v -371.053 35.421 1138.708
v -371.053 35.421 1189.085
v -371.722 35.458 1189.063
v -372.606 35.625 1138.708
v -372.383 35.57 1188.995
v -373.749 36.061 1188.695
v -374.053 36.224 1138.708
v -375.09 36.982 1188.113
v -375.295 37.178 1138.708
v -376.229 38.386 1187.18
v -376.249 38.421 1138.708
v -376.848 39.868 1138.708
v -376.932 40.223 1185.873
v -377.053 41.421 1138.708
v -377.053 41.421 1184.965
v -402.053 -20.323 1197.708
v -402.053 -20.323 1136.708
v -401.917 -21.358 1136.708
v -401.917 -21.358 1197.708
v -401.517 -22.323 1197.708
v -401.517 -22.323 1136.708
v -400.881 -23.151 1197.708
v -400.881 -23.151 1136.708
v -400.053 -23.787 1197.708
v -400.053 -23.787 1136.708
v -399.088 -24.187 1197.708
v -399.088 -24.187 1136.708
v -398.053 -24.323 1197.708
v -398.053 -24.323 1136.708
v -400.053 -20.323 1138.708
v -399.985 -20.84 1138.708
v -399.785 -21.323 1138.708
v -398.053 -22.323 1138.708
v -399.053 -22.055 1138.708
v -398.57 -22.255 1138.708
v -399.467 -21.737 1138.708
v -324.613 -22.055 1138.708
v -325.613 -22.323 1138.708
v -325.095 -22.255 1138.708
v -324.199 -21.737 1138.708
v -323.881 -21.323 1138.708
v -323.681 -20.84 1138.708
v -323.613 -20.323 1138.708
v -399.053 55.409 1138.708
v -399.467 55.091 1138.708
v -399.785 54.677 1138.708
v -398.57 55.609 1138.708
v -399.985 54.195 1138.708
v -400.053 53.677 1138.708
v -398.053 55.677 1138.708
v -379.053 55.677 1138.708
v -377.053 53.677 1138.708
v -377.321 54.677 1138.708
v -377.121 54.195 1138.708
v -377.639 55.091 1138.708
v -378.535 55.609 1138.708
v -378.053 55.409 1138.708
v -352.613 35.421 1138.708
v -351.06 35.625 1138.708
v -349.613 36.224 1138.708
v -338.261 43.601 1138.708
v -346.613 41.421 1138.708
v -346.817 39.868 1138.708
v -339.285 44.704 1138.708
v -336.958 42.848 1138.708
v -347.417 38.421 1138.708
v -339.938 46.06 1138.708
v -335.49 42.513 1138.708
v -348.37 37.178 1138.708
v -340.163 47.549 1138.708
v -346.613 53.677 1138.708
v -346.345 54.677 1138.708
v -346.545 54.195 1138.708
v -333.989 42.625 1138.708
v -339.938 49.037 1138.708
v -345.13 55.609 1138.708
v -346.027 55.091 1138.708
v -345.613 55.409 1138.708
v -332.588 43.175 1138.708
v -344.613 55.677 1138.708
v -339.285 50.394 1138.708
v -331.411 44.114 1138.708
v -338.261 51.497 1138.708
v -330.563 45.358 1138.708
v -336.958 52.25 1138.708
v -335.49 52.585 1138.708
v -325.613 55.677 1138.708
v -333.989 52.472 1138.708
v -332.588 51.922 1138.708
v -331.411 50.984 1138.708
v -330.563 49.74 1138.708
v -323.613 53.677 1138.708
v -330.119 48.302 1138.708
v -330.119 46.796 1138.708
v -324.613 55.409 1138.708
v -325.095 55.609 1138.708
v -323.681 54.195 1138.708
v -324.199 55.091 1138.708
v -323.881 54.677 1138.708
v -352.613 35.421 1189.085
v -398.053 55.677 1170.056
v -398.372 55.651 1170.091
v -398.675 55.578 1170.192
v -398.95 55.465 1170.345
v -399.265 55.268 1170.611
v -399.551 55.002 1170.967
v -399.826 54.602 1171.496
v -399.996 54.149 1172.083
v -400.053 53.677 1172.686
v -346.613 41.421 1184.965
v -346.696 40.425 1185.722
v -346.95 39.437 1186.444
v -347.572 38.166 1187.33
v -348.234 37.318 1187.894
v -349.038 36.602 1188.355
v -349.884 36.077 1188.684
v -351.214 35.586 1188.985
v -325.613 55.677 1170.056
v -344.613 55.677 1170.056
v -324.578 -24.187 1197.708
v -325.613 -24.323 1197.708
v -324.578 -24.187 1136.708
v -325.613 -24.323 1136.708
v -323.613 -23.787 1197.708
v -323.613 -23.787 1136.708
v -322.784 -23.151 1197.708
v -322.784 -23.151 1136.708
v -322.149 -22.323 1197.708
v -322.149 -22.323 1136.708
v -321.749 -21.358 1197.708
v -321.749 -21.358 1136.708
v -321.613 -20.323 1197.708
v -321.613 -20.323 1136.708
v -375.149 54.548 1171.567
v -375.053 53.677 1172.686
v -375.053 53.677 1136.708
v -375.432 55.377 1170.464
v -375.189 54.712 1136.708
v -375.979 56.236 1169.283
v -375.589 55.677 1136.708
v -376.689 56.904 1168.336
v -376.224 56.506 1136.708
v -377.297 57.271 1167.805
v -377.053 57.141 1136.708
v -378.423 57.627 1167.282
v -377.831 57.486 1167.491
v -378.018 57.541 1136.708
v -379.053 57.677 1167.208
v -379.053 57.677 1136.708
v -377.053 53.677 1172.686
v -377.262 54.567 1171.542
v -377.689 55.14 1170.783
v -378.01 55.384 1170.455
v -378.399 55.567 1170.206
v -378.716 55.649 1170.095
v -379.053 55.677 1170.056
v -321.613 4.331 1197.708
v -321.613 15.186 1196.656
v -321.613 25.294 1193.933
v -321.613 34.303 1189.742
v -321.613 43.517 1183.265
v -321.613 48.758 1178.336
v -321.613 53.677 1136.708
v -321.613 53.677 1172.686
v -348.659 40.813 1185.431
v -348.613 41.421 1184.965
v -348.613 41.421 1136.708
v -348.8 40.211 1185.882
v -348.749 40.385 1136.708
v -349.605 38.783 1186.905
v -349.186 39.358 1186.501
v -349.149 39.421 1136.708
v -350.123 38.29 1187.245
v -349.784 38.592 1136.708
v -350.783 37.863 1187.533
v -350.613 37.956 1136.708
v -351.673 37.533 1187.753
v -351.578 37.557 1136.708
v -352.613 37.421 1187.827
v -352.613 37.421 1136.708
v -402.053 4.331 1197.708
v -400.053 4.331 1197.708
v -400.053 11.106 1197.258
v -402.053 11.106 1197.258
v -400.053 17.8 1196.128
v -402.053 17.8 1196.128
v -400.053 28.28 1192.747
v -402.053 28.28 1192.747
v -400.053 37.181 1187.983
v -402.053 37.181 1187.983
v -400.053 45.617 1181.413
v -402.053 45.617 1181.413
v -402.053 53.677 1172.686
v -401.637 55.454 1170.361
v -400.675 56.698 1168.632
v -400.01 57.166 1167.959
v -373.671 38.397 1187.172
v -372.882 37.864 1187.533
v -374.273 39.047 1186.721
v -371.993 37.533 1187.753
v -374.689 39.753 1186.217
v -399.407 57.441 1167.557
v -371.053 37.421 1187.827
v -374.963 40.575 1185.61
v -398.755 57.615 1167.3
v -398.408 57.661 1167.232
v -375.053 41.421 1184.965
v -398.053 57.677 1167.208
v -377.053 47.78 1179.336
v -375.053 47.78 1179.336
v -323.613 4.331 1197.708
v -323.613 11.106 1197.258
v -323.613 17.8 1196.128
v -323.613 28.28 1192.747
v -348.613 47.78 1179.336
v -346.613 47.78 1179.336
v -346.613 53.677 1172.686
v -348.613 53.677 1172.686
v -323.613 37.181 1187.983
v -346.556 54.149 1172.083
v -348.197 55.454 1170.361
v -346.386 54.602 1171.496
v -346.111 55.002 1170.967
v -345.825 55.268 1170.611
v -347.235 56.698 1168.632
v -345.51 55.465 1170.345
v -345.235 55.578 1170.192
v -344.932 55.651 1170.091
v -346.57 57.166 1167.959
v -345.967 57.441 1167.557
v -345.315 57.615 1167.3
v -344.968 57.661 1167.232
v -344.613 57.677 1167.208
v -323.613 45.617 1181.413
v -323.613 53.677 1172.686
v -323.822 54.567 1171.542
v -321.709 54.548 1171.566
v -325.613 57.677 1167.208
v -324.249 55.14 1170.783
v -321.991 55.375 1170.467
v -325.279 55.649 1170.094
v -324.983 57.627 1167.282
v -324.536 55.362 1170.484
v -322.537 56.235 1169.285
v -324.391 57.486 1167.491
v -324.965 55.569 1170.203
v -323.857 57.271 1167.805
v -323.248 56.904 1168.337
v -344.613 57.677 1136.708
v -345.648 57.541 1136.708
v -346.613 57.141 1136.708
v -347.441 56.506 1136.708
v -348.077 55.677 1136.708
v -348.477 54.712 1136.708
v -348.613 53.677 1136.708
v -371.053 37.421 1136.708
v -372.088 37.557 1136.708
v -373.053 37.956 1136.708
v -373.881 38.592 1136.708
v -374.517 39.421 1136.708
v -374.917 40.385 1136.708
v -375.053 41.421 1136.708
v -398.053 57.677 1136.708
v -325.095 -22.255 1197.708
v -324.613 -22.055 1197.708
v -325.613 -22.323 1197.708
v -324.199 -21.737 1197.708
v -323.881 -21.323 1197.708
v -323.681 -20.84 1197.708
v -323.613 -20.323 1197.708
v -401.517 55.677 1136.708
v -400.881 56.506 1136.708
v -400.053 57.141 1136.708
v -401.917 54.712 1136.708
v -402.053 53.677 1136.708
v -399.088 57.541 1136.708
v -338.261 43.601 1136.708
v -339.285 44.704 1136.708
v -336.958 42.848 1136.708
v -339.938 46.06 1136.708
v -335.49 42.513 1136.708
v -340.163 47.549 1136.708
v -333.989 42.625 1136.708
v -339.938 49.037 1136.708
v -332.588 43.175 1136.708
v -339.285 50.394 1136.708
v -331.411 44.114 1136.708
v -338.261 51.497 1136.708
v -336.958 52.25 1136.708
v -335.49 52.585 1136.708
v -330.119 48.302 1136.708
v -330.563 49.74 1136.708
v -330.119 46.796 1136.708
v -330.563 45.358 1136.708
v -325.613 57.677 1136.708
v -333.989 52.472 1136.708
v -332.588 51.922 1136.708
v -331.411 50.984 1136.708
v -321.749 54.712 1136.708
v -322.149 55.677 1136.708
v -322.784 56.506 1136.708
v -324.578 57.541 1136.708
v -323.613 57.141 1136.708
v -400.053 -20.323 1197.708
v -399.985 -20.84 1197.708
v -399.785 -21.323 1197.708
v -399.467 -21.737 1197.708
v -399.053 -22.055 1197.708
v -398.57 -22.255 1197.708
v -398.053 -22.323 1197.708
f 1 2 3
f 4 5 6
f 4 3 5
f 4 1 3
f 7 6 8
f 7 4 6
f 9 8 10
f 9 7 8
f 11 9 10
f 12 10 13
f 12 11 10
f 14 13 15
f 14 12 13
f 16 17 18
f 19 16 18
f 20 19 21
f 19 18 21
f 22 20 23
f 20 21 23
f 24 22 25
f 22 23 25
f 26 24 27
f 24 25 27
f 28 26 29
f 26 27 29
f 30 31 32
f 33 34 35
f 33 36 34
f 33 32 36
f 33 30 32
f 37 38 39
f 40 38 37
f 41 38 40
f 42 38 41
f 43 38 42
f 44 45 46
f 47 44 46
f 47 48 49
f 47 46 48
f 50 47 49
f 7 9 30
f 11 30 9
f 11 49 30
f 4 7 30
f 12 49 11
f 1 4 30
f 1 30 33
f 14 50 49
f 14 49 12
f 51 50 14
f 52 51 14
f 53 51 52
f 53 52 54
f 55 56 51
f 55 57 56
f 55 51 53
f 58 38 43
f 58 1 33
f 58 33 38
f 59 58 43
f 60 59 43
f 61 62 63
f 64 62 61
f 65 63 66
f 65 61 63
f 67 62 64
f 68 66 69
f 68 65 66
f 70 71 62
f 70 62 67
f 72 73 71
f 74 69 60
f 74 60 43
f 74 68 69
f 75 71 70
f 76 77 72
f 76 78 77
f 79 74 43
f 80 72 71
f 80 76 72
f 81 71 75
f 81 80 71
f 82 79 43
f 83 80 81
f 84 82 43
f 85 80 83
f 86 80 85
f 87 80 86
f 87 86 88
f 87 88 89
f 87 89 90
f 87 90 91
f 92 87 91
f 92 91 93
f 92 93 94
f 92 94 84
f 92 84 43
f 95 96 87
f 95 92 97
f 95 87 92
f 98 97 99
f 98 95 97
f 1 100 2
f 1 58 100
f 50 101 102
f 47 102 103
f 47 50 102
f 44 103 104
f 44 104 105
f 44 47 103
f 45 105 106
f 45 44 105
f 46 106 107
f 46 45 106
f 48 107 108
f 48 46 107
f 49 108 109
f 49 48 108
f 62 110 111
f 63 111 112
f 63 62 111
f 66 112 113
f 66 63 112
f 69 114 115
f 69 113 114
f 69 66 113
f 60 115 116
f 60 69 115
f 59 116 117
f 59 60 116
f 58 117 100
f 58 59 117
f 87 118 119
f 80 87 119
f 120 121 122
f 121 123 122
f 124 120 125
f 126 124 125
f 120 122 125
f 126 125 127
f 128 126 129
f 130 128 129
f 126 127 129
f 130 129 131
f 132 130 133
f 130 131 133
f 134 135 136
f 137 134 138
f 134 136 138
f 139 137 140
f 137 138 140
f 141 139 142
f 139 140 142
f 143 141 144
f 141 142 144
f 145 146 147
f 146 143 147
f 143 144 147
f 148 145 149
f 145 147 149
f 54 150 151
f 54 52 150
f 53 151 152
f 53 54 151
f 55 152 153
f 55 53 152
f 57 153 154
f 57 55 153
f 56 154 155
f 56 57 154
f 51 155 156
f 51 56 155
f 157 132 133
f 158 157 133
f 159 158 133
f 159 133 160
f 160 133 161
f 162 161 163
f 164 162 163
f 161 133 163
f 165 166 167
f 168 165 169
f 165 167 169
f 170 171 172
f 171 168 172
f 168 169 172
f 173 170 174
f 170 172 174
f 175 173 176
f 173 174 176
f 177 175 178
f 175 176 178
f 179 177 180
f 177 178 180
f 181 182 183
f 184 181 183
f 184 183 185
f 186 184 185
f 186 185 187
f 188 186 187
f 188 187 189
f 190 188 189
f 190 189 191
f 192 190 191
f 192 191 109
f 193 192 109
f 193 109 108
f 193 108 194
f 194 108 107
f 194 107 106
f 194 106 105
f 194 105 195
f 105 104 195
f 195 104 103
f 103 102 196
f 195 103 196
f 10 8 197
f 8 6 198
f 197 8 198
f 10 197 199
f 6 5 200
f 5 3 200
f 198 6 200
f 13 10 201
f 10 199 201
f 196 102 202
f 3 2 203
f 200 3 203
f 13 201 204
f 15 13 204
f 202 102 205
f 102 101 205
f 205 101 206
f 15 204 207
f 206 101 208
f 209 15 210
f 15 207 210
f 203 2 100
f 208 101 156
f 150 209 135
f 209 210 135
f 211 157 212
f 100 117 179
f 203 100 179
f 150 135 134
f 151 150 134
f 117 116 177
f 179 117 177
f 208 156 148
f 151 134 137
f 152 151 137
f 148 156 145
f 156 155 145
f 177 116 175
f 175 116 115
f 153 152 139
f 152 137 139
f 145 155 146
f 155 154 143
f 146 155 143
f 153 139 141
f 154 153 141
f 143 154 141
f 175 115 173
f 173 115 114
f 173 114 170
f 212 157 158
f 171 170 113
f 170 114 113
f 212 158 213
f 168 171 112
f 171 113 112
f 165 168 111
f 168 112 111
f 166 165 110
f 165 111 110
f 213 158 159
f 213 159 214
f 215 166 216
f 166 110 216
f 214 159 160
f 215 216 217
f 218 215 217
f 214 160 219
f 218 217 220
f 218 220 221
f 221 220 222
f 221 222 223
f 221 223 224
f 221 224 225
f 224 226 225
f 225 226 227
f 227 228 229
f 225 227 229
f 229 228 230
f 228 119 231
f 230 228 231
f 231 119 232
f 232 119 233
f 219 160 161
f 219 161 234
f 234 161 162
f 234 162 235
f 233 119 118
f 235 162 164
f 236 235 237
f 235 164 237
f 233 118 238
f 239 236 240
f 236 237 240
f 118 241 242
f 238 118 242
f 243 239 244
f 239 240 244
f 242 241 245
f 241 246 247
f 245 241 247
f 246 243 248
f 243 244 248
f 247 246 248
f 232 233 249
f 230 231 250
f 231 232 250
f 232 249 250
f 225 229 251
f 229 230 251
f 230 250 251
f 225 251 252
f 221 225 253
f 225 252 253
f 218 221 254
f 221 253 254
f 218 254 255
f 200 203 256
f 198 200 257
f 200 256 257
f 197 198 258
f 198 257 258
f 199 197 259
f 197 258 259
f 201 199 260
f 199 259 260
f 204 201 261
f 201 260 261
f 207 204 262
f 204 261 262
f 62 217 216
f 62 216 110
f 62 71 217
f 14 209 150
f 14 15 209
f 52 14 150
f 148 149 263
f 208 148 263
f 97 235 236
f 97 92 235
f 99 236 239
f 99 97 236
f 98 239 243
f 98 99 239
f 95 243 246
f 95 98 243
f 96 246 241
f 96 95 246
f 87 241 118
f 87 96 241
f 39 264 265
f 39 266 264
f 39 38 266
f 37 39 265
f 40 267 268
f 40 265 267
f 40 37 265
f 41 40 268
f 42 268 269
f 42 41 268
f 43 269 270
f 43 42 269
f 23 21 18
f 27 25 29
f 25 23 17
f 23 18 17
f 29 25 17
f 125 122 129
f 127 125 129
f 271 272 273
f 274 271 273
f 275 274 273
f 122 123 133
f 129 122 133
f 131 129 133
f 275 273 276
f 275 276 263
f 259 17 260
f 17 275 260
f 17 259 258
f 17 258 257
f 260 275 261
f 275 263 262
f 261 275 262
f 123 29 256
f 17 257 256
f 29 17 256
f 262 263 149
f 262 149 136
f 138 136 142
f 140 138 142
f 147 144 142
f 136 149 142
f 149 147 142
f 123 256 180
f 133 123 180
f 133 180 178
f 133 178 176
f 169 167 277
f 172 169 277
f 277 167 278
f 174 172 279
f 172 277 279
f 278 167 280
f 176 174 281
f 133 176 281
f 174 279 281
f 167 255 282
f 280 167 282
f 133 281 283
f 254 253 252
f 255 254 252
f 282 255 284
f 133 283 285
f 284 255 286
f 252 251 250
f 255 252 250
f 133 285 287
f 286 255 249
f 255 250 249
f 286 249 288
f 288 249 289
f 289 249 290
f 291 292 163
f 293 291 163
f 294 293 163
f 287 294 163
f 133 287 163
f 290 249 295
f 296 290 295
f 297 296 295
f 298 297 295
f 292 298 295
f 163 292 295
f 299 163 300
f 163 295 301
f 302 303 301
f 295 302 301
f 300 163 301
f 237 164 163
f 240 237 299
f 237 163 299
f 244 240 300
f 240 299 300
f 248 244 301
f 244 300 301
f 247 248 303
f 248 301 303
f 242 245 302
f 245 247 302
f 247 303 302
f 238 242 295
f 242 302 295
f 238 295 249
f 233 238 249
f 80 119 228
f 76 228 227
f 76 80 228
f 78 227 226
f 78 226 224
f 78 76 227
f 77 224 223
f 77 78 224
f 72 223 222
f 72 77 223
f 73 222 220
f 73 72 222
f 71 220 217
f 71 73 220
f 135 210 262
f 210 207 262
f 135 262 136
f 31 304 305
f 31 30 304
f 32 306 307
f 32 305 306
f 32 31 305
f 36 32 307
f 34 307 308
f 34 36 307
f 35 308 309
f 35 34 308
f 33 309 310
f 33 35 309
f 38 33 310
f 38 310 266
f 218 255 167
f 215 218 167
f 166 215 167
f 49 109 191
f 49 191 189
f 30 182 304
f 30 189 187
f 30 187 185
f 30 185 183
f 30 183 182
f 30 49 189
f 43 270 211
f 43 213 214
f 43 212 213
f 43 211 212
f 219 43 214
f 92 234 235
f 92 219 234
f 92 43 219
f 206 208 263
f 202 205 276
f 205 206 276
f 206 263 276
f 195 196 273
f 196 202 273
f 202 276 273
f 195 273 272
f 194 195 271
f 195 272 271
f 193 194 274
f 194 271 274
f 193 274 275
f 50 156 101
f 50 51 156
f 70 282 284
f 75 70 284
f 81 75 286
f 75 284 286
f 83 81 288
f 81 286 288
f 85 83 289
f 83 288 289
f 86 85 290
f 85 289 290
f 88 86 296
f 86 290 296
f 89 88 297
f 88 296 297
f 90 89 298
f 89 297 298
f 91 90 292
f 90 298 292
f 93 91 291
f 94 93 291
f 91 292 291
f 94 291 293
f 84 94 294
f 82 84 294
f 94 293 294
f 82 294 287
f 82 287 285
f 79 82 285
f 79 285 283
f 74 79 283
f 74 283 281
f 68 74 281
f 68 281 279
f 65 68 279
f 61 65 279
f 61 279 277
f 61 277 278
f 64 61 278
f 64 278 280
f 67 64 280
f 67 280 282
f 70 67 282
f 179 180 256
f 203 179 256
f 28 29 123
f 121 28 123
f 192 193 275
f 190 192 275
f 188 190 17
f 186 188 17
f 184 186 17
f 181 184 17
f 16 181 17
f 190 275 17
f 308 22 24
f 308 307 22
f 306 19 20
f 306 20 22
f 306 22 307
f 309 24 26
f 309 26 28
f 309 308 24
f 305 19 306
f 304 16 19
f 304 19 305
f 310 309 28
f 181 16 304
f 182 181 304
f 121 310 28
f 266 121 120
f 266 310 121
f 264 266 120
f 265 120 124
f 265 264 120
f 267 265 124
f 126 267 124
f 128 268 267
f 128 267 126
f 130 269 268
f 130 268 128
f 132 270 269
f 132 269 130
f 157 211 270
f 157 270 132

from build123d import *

# Parameters (mm, degrees)
BOSS_EXTRUDE2_DEPTH      = 10
BOSS_EXTRUDE2_DEPTH_BACK = 51
SHELL2_T                 = -2
CUT_EXTRUDE2_DEPTH       = 81.44
SKETCH4_R                = 5.05
CUT_EXTRUDE3_DEPTH       = 62.0000001


with BuildPart() as part:
    # Sketch1 → Boss-Extrude2 (new body, two sides)
    with BuildSketch(Plane(origin=(0, 0, 1146.708434145), x_dir=(-1, 0, 0), z_dir=(0, 0, -1))) as boss_extrude2_sk:
        with BuildLine():
            Line((398.052845122, -24.322837047), (325.612845122, -24.322837047))
            ThreePointArc((325.612845122, -24.322837047), (322.784417997, -23.151264171), (321.612845122, -20.322837047))
            Line((321.612845122, -20.322837047), (321.612845122, 53.677162953))
            ThreePointArc((321.612845122, 53.677162953), (322.784417997, 56.505590078), (325.612845122, 57.677162953))
            Line((325.612845122, 57.677162953), (344.612845122, 57.677162953))
            ThreePointArc((344.612845122, 57.677162953), (347.441272247, 56.505590078), (348.612845122, 53.677162953))
            Line((348.612845122, 53.677162953), (348.612845122, 41.420568524))
            ThreePointArc((348.612845122, 41.420568524), (349.784417997, 38.5921414), (352.612845122, 37.420568524))
            Line((352.612845122, 37.420568524), (371.052845122, 37.420568524))
            ThreePointArc((371.052845122, 37.420568524), (373.881272247, 38.5921414), (375.052845122, 41.420568524))
            Line((375.052845122, 41.420568524), (375.052845122, 53.677162953))
            ThreePointArc((375.052845122, 53.677162953), (376.224417997, 56.505590078), (379.052845122, 57.677162953))
            Line((379.052845122, 57.677162953), (398.052845122, 57.677162953))
            ThreePointArc((398.052845122, 57.677162953), (400.881272247, 56.505590078), (402.052845122, 53.677162953))
            Line((402.052845122, 53.677162953), (402.052845122, -20.322837047))
            ThreePointArc((402.052845122, -20.322837047), (400.881272247, -23.151264171), (398.052845122, -24.322837047))
        make_face()
    extrude(amount=BOSS_EXTRUDE2_DEPTH)
    extrude(boss_extrude2_sk.sketch, amount=-BOSS_EXTRUDE2_DEPTH_BACK)

    # Shell2
    shell2_openings = [part.faces().sort_by_distance(p)[0] for p in [
        (-361.832845122, 32.113014346, 1197.708434145),
    ]]
    offset(amount=SHELL2_T, openings=shell2_openings, kind=Kind.INTERSECTION)

    # Sketch2 → Cut-Extrude2 (cut, through all)
    with BuildSketch(Plane(origin=(-321.612845122, 0, 0), x_dir=(0, 0, -1), z_dir=(1, 0, 0))):
        with BuildLine():
            Line((-1197.708434145, 4.331235789), (-1202.700494478, 4.331235789))
            Line((-1202.700494478, 4.331235789), (-1202.700494478, 60.889226386))
            Line((-1202.700494478, 60.889226386), (-1167.208434145, 60.889226386))
            Line((-1167.208434145, 60.889226386), (-1167.208434145, 57.677162953))
            add(Edge.make_bspline(
                [(-1197.708434145, 4.331235789), (-1197.068834598, 37.525012085), (-1167.208434145, 57.677162953)],
                knots=[0, 0, 0, 1, 1, 1], degree=2))
        make_face()
    extrude(amount=-CUT_EXTRUDE2_DEPTH, mode=Mode.SUBTRACT)

    # Sketch4 → Cut-Extrude3 (cut, through all)
    with BuildSketch(Plane(origin=(0, 0, 1136.708434145), x_dir=(-1, 0, 0), z_dir=(0, 0, -1))):
        with Locations((335.112845122, 47.548865739)):
            Circle(SKETCH4_R)
    extrude(amount=-CUT_EXTRUDE3_DEPTH, mode=Mode.SUBTRACT)


solid = part.part
